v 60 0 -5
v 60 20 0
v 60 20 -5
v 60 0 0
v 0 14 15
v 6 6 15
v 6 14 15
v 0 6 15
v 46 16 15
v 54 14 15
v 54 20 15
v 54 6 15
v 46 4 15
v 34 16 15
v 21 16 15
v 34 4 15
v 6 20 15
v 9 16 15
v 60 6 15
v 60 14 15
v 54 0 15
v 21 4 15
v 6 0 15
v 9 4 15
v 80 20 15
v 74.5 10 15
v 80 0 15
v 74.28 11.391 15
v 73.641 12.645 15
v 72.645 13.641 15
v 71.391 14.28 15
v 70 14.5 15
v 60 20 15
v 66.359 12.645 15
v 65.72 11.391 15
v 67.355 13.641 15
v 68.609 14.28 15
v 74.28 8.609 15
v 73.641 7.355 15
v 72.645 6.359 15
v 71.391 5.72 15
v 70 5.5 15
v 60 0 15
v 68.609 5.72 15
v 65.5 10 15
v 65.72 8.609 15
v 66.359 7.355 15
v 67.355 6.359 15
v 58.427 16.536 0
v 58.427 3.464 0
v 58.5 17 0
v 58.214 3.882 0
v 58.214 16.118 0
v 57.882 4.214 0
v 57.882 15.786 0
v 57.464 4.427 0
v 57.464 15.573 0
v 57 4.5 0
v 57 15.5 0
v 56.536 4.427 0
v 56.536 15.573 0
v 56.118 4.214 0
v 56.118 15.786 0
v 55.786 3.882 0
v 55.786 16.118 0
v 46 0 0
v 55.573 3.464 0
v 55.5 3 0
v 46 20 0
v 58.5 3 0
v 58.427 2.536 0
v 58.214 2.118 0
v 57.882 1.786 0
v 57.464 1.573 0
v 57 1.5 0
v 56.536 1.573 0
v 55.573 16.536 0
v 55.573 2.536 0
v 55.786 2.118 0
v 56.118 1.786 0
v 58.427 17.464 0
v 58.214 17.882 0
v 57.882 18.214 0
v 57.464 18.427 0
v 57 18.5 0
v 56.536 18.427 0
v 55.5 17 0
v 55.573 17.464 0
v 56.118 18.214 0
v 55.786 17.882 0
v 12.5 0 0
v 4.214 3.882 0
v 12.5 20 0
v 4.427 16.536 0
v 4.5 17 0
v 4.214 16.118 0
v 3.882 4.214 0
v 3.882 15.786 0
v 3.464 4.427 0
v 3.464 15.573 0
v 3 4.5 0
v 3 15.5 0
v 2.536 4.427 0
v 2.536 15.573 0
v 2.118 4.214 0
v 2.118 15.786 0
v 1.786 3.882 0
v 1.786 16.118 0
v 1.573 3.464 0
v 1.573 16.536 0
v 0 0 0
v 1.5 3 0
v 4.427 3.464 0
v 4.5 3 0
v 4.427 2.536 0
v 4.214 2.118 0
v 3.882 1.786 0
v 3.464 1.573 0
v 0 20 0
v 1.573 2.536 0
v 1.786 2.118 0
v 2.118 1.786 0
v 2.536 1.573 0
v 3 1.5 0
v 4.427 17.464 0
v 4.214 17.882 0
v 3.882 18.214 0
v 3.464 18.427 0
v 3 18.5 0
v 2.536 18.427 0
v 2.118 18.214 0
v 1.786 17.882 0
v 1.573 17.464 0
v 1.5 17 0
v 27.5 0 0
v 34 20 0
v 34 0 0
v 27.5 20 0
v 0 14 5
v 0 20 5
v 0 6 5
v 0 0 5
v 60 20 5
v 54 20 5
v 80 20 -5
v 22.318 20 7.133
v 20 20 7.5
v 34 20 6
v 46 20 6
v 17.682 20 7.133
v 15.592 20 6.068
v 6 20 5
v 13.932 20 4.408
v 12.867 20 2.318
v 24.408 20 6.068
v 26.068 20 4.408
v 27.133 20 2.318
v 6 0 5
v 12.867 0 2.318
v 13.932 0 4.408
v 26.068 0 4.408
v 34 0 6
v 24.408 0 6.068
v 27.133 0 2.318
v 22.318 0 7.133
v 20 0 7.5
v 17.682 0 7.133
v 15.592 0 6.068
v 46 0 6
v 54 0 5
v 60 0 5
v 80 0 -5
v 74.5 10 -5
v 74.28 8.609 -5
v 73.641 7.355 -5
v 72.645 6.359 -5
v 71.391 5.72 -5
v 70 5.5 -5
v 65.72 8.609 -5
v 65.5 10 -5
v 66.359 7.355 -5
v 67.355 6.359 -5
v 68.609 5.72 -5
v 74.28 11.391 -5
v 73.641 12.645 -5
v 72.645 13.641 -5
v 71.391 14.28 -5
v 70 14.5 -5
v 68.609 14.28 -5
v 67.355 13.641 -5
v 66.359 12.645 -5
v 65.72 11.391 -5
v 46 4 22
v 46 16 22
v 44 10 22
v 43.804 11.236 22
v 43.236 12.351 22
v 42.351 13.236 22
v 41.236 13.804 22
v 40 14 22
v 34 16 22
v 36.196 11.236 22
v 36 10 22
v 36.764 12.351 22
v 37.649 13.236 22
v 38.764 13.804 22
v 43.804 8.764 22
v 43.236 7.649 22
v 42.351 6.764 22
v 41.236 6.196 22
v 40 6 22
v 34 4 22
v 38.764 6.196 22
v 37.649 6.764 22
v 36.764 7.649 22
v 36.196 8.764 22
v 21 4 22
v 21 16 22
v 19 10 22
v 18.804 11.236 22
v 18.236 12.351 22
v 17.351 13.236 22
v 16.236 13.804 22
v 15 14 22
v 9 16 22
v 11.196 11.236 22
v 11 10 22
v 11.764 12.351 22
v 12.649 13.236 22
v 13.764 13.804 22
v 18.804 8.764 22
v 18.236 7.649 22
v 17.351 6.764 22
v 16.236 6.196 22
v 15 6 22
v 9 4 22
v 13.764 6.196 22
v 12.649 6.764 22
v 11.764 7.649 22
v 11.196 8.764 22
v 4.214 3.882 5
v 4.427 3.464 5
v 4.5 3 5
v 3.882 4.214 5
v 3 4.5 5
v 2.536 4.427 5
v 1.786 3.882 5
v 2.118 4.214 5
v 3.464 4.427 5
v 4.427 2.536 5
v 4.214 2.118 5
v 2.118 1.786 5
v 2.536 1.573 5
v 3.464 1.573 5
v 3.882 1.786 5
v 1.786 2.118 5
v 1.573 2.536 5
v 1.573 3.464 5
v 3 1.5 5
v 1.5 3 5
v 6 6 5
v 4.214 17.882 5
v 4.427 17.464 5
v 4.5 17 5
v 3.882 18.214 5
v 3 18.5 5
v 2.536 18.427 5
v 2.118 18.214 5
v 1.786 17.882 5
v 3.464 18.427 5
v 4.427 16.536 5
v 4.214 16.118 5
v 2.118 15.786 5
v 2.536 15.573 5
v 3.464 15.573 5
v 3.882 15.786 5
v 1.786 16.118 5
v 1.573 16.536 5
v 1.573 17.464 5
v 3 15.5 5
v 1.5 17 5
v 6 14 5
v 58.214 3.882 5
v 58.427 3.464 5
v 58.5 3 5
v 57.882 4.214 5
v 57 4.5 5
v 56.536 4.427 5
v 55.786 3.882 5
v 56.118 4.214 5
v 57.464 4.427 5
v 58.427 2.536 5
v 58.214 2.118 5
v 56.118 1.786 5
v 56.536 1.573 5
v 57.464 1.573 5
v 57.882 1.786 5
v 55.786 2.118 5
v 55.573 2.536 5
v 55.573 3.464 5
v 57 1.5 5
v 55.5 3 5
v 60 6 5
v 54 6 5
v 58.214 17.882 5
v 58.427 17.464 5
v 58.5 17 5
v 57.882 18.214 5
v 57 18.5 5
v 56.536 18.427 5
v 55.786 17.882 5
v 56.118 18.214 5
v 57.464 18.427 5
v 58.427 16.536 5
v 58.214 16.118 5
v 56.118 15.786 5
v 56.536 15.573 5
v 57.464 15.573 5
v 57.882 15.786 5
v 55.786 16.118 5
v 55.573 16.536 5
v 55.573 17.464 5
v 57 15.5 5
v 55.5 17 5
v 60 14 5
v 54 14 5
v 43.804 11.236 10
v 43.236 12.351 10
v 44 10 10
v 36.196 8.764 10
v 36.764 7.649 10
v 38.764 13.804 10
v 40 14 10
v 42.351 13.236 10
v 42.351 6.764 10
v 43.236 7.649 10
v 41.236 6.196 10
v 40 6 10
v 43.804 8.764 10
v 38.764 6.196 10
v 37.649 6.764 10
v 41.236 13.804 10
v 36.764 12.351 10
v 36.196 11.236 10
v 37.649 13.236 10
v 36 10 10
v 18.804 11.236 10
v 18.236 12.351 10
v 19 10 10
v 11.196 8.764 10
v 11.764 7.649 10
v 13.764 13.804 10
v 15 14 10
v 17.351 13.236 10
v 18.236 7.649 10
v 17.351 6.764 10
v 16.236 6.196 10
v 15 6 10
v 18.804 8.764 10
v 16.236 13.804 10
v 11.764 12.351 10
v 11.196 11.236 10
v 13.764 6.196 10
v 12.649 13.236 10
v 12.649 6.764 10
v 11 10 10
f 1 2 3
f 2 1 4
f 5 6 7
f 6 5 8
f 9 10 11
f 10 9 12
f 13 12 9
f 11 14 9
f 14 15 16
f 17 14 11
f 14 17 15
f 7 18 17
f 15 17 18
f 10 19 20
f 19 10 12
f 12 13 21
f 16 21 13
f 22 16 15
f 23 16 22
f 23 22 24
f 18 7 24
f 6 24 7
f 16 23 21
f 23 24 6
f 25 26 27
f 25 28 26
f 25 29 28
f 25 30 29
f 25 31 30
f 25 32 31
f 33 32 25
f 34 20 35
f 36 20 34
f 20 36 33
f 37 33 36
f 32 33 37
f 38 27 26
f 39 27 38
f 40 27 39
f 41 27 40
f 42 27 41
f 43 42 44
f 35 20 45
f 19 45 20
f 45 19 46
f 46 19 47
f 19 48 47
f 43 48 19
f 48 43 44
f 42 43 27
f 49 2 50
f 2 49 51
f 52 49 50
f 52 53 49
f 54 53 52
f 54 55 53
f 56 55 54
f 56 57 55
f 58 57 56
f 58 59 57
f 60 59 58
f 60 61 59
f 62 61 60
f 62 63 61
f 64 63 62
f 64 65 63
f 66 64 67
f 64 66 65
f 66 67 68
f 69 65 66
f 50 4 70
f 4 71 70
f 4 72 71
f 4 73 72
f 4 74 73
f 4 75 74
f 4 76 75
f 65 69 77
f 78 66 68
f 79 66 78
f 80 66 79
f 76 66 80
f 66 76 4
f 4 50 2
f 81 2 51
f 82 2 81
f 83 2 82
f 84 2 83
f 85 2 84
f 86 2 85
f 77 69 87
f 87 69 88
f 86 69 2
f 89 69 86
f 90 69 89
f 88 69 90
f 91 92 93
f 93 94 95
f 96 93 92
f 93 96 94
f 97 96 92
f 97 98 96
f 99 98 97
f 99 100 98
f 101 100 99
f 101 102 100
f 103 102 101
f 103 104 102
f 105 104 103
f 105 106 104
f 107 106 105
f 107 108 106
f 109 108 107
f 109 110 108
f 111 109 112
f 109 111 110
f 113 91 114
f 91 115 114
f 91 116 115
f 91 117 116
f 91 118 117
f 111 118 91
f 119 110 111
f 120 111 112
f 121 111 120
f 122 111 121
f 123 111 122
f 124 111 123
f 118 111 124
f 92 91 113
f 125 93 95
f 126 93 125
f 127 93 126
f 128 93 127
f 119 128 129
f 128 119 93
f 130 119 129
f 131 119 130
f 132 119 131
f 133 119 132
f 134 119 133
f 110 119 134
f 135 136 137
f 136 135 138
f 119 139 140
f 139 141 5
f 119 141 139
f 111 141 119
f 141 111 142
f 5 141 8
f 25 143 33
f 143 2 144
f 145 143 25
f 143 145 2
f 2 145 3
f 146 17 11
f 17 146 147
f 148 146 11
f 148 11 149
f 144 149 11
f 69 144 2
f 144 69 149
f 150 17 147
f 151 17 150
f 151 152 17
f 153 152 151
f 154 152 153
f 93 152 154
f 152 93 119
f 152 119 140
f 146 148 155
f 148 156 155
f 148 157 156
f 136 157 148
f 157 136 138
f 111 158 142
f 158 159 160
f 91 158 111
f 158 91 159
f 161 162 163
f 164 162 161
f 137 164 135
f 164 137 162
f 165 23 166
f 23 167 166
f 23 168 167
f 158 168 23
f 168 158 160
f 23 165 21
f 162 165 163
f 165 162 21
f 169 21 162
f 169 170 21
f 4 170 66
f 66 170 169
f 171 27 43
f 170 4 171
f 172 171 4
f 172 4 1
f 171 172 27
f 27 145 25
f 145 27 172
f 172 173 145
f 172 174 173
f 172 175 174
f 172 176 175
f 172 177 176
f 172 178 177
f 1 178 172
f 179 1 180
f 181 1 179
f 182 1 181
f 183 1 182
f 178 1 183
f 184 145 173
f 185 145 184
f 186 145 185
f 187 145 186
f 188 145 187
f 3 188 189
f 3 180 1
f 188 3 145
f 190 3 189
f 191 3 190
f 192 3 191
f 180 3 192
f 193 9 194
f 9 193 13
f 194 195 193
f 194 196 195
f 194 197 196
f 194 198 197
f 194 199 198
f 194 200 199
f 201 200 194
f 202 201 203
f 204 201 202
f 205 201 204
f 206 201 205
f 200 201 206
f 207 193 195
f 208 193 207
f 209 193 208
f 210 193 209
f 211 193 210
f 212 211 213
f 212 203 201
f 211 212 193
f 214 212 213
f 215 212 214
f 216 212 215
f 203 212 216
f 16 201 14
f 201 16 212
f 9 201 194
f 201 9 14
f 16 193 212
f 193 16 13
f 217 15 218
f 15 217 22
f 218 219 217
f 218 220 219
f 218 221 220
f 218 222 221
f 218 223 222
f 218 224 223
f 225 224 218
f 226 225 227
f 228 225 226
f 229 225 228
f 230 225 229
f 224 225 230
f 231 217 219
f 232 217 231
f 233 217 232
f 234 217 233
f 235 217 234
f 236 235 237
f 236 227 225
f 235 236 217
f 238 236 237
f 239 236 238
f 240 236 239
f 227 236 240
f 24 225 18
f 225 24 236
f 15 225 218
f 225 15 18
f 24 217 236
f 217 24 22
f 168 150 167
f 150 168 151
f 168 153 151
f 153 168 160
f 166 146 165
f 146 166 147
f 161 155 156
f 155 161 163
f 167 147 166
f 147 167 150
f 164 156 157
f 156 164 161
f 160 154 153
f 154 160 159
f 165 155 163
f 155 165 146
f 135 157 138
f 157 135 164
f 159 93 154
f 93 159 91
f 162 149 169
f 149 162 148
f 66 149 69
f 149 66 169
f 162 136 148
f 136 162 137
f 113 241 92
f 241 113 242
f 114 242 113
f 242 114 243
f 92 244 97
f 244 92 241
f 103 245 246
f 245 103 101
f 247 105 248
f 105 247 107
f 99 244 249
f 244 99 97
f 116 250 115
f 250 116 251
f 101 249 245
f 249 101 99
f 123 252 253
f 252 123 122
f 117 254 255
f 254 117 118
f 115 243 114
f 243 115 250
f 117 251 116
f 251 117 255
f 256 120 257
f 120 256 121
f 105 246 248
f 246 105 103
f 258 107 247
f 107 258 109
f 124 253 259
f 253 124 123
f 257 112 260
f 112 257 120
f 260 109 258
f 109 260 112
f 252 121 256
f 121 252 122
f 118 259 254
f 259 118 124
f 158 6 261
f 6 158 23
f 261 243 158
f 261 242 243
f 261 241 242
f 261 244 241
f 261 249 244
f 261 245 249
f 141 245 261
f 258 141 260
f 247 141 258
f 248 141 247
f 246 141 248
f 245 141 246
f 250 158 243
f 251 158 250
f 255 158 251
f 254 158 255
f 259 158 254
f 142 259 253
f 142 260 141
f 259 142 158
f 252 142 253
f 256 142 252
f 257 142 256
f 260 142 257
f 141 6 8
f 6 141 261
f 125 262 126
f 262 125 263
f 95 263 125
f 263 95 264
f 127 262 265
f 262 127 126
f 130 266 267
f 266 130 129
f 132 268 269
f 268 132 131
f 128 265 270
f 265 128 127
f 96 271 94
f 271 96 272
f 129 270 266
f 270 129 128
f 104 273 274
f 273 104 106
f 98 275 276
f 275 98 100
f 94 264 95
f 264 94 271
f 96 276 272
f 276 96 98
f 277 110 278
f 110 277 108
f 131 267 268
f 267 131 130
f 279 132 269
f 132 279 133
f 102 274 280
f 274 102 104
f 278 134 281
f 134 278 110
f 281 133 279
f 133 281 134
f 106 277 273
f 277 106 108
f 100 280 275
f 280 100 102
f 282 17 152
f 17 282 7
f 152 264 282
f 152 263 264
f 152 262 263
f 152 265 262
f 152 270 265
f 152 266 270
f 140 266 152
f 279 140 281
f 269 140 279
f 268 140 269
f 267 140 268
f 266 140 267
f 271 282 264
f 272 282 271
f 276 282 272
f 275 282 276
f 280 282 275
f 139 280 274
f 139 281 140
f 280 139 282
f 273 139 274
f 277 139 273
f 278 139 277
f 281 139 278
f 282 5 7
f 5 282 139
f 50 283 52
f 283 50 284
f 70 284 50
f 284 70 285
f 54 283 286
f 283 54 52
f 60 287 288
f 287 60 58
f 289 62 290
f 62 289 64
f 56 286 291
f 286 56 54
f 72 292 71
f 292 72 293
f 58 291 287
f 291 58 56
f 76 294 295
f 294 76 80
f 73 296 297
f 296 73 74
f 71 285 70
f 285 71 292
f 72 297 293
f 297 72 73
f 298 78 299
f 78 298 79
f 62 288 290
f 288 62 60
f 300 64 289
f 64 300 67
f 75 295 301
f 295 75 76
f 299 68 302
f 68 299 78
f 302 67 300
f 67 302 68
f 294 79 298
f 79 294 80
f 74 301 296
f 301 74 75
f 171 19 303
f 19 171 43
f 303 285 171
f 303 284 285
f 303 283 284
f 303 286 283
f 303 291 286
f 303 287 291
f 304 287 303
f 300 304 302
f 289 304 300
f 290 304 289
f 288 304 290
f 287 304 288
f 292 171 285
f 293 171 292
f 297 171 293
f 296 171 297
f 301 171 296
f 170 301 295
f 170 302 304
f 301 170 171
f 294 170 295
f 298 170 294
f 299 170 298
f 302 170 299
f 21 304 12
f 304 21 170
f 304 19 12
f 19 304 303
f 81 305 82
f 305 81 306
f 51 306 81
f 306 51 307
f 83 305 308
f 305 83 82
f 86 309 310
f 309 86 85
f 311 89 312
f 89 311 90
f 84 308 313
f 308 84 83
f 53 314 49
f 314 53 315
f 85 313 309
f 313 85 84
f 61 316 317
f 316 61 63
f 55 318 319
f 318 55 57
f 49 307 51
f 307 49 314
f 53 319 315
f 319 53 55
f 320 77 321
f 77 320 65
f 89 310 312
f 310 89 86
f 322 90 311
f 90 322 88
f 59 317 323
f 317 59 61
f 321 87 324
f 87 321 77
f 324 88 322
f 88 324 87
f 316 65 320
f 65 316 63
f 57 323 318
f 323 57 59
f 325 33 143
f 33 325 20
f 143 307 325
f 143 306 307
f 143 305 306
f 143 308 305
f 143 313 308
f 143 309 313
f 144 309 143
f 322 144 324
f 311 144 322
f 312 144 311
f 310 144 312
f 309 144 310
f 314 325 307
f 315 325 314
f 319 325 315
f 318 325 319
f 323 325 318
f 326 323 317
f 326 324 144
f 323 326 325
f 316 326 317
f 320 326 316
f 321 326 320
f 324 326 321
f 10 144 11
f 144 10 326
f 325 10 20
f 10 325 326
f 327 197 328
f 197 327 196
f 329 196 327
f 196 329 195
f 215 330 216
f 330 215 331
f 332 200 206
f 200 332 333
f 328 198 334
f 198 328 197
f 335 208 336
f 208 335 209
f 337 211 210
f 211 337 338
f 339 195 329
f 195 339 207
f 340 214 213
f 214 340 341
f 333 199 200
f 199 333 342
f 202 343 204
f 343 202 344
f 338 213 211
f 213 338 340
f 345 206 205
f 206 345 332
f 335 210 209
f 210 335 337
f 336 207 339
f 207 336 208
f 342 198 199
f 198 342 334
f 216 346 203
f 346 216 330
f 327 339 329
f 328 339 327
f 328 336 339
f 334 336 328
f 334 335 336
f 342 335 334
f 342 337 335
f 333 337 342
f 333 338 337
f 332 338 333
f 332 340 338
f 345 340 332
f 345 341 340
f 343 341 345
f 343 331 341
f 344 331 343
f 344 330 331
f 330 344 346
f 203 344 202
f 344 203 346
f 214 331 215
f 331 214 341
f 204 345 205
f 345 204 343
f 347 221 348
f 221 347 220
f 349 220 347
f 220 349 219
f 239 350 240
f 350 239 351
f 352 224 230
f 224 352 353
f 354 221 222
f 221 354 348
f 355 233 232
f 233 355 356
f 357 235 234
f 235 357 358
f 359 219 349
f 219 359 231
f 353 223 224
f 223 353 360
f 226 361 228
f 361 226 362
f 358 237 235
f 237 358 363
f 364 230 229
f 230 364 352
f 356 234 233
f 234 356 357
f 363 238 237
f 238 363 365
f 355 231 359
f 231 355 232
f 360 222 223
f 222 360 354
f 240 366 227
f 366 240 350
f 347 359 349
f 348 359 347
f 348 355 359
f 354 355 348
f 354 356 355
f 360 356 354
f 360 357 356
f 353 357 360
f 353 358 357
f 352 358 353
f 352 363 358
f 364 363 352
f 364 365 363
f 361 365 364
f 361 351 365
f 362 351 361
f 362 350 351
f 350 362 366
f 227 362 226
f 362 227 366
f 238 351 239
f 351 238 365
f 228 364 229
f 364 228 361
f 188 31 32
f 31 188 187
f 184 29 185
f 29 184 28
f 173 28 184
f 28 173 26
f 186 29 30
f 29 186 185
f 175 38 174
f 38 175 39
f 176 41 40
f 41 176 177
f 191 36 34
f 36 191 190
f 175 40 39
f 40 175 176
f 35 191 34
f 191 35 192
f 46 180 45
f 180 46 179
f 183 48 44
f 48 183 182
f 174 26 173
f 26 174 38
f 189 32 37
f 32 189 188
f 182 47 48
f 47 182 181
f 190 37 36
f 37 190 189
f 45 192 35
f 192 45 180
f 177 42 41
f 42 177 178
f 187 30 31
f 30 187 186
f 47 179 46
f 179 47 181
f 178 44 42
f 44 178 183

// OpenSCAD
kreis = 20;

difference(){
union(){
cube([60,20,15]);

translate([60,0,-5])
cube([20,20,20]);

translate([40,10,12])
cube([12,12,20],center=true);

translate([15,10,12])
cube([12,12,20],center=true);
}

union(){
//befestigungen
translate([20,-0.5,0])
rotate([0,90,90])
color([90,0,0])
#cylinder(r = 7.5, h = 21, $fn = kreis);


translate([46,-0.5,6])
rotate([0,90,90])
color([90,0,0])
#cube([12,12,21]);

//schrauben

translate([3,3,-0.5])
#cylinder(r = 1.5, h = 16, $fn = kreis);

translate([3,3,10])
#cube([6,6,10], center = true);

translate([3,17,-0.5])
#cylinder(r = 1.5, h = 16, $fn = kreis);

translate([3,17,10])
#cube([6,6,10], center = true);

translate([57,3,-0.5])
#cylinder(r = 1.5, h = 16, $fn = kreis);

translate([57,3,10])
#cube([6,6,10], center = true);

translate([57,17,-0.5])
#cylinder(r = 1.5, h = 16, $fn = kreis);

translate([57,17,10])
#cube([6,6,10], center = true);

// Bef_achsen
translate([40,10,10])
#cylinder(r = 4, h = 12, $fn = kreis);

// Bef_achsen
translate([15,10,10])
#cylinder(r = 4, h = 12, $fn = kreis);

// Bef_achsen
translate([70,10,-5])
#cylinder(r = 4.5, h = 25, $fn = kreis);

}
}
